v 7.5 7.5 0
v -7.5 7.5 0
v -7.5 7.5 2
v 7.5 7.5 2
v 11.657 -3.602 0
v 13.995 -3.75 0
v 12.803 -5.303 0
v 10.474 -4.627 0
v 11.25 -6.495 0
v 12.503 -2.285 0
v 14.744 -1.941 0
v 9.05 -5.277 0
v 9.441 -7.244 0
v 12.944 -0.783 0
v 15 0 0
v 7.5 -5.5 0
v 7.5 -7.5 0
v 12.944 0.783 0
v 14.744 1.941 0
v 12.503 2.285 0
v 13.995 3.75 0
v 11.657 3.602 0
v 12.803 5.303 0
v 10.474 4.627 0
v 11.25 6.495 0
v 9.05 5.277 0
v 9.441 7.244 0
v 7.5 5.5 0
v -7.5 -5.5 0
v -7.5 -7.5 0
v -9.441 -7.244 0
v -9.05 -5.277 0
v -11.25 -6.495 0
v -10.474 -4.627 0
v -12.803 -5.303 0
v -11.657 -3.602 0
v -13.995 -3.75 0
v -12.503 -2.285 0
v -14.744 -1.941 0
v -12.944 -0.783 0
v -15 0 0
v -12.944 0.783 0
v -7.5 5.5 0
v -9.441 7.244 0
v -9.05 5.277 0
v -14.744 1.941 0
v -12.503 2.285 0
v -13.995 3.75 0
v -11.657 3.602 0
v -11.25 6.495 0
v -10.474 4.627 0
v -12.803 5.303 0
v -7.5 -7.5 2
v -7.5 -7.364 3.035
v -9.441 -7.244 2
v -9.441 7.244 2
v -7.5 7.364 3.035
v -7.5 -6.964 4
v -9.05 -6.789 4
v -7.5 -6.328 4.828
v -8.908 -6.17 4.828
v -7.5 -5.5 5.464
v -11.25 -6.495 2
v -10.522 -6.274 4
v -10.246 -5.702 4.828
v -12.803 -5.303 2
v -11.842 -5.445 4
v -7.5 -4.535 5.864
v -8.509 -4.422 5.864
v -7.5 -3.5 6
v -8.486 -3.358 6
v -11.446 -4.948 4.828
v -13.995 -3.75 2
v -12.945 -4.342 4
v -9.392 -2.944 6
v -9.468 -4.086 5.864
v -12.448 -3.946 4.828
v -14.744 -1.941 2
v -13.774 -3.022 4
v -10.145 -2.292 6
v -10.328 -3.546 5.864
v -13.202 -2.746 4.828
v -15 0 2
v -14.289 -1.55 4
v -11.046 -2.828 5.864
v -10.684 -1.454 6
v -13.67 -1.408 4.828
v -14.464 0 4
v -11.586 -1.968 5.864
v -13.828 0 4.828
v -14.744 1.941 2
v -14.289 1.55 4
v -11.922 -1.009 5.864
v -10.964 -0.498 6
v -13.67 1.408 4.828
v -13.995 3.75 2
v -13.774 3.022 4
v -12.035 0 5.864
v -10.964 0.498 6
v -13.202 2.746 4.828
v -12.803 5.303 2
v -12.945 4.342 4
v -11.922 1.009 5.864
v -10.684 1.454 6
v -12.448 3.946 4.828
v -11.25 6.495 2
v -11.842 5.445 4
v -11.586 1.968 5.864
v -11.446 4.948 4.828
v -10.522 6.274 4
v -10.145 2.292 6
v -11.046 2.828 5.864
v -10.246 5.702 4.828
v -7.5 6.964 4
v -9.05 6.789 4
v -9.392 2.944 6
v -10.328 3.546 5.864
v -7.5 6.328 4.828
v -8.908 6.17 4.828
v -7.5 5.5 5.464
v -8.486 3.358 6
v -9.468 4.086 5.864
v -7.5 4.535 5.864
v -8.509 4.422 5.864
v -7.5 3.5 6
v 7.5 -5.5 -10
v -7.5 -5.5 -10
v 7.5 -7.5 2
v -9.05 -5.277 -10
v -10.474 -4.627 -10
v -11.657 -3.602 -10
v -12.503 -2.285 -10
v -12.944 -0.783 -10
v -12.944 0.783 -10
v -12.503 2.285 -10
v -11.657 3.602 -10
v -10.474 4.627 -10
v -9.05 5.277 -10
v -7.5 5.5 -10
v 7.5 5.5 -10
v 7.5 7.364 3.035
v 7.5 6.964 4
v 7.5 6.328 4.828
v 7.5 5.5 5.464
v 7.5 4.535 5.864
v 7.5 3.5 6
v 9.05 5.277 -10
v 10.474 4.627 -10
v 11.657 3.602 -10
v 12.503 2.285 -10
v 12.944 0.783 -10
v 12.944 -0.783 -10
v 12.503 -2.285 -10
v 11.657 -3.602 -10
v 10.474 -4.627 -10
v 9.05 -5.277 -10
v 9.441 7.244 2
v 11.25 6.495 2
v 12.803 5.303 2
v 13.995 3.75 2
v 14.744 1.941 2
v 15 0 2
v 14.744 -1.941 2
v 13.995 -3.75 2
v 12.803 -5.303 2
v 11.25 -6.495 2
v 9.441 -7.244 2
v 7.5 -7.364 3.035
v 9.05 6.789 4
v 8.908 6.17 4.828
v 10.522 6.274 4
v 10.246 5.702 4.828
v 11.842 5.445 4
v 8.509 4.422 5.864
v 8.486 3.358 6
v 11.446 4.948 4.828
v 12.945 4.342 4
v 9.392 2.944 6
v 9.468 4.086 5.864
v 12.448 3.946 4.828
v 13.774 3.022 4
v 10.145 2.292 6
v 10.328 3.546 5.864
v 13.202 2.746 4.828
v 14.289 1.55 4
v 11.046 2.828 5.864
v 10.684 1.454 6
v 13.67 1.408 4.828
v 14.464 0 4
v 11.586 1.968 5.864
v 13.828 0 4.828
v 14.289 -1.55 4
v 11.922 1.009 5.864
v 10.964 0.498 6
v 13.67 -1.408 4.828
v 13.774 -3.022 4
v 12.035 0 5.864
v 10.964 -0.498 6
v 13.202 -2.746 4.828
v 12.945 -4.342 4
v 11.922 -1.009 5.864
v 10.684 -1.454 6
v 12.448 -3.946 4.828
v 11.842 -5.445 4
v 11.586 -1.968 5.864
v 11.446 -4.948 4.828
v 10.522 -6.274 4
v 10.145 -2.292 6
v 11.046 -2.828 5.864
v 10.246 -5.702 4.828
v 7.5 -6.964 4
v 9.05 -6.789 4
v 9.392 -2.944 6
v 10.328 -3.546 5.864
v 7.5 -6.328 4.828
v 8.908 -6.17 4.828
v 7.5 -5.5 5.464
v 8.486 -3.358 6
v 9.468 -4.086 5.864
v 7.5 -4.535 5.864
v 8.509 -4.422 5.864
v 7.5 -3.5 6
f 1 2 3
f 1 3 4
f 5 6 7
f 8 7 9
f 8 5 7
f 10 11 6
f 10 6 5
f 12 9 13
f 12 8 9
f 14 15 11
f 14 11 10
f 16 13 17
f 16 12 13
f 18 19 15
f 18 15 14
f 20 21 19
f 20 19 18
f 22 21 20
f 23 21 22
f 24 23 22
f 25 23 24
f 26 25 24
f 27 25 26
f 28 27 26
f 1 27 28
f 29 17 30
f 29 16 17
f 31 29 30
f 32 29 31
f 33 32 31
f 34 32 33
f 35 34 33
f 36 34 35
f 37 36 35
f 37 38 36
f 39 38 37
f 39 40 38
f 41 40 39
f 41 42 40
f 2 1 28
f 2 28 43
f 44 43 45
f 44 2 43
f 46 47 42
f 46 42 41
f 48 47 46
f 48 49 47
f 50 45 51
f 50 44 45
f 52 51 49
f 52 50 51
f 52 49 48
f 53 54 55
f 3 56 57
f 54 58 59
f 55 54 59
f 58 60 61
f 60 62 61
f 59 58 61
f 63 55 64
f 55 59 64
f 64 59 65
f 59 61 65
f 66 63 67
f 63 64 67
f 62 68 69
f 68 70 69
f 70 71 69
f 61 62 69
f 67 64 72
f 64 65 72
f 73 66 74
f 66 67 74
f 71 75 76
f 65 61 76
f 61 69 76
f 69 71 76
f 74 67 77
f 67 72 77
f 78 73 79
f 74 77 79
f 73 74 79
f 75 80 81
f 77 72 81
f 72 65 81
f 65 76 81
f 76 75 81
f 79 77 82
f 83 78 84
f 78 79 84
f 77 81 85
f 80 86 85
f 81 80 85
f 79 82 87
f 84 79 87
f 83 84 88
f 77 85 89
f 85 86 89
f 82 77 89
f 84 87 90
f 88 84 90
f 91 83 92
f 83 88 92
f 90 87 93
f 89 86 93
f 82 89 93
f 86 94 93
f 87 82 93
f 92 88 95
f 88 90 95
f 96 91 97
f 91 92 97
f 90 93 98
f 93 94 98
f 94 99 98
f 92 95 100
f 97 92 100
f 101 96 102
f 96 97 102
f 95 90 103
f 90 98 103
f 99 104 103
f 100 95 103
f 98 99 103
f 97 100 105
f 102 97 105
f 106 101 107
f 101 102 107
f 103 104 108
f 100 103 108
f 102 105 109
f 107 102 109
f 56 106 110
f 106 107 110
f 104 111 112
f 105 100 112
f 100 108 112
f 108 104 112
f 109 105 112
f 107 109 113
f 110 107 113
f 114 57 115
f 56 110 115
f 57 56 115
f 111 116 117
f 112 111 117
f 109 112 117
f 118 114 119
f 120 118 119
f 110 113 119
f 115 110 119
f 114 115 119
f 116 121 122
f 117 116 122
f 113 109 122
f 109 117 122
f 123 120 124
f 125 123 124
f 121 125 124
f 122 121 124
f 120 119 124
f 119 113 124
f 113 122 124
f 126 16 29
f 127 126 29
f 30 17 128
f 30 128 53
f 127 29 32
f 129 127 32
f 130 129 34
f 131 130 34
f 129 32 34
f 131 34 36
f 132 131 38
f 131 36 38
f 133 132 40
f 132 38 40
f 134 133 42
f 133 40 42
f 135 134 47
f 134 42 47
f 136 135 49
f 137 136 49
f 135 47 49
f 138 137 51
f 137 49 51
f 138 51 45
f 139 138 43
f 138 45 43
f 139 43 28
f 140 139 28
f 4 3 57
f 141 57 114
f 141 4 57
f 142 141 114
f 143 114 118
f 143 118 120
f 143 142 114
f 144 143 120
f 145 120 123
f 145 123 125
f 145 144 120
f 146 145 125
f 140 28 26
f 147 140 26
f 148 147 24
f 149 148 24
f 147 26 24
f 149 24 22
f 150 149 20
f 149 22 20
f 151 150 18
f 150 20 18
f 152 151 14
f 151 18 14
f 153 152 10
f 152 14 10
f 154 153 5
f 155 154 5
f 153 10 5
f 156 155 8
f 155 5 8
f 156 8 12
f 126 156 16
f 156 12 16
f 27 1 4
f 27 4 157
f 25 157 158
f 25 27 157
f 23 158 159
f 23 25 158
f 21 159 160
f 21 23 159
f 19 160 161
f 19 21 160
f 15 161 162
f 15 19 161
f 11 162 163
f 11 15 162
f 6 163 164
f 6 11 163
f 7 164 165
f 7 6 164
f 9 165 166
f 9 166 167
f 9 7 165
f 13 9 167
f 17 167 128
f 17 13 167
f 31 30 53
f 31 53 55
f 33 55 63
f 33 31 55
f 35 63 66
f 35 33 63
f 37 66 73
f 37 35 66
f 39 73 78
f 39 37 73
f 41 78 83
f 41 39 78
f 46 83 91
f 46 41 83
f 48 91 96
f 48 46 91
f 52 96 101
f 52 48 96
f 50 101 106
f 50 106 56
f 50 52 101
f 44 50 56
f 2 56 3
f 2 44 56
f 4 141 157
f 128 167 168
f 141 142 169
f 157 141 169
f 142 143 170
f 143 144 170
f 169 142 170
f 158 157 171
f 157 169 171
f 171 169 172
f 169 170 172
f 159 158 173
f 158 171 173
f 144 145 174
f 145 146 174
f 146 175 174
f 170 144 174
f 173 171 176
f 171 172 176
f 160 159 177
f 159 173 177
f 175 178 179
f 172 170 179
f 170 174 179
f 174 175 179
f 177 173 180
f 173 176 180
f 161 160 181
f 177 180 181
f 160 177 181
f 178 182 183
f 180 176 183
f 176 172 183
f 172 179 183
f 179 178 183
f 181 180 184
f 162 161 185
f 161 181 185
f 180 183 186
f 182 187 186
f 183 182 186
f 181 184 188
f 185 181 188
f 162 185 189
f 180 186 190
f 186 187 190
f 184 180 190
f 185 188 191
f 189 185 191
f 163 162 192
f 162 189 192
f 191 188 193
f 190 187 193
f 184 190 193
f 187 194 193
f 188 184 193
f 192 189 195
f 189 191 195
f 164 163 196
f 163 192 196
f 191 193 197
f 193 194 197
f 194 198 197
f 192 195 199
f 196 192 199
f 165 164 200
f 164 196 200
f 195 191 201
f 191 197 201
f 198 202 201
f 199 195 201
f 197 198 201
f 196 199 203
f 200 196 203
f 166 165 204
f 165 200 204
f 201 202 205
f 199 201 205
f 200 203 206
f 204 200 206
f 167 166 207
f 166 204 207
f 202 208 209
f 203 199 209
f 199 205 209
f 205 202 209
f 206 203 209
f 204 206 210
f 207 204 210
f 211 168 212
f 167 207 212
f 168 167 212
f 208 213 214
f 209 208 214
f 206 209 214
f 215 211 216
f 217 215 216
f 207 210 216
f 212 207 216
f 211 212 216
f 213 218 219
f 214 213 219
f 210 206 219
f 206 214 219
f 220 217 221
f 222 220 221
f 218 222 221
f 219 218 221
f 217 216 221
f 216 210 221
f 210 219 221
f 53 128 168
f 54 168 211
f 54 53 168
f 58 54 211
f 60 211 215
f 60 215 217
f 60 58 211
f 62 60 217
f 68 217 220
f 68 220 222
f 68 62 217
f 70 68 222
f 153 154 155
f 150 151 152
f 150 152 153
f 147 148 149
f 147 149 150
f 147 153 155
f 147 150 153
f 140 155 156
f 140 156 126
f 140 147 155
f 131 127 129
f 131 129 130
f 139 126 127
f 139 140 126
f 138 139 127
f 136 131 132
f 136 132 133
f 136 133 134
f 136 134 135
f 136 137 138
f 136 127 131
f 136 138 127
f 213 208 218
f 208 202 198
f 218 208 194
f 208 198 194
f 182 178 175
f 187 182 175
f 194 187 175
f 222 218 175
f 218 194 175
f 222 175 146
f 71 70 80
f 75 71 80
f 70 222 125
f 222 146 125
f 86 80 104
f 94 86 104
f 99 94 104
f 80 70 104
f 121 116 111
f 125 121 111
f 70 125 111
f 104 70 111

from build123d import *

# Parameters (mm, degrees)
EXTRUDE_1_DEPTH = 6
EXTRUDE_2_DEPTH = 10
FILLET_1_R      = 4


with BuildPart() as part:
    # Эскиз1 → Бобышка-Вытянуть1 (new body)
    with BuildSketch(Plane.XY):
        with BuildLine():
            Line((-7.5, 7.5), (7.5, 7.5))
            ThreePointArc((7.5, 7.5), (15, 0), (7.5, -7.5))
            Line((7.5, -7.5), (-7.5, -7.5))
            ThreePointArc((-7.5, -7.5), (-15, 0), (-7.5, 7.5))
        make_face()
    extrude(amount=EXTRUDE_1_DEPTH)

    # Эскиз2 → Бобышка-Вытянуть2 (add)
    with BuildSketch(Plane(origin=(0, 0, 0), x_dir=(-1, 0, 0), z_dir=(0, 0, -1))):
        with BuildLine():
            Line((7.5, 5.5), (-7.5, 5.5))
            ThreePointArc((-7.5, 5.5), (-13, 0), (-7.5, -5.5))
            Line((-7.5, -5.5), (7.5, -5.5))
            ThreePointArc((7.5, -5.5), (13, 0), (7.5, 5.5))
        make_face()
    extrude(amount=EXTRUDE_2_DEPTH)

    # Скругление1
    fillet_1_edges = [part.edges().sort_by_distance(p)[0] for p in [
        (15, 0, 6),
        (0, 7.5, 6),
        (-15, 0, 6),
        (0, -7.5, 6),
    ]]
    fillet(fillet_1_edges, radius=FILLET_1_R)


solid = part.part
